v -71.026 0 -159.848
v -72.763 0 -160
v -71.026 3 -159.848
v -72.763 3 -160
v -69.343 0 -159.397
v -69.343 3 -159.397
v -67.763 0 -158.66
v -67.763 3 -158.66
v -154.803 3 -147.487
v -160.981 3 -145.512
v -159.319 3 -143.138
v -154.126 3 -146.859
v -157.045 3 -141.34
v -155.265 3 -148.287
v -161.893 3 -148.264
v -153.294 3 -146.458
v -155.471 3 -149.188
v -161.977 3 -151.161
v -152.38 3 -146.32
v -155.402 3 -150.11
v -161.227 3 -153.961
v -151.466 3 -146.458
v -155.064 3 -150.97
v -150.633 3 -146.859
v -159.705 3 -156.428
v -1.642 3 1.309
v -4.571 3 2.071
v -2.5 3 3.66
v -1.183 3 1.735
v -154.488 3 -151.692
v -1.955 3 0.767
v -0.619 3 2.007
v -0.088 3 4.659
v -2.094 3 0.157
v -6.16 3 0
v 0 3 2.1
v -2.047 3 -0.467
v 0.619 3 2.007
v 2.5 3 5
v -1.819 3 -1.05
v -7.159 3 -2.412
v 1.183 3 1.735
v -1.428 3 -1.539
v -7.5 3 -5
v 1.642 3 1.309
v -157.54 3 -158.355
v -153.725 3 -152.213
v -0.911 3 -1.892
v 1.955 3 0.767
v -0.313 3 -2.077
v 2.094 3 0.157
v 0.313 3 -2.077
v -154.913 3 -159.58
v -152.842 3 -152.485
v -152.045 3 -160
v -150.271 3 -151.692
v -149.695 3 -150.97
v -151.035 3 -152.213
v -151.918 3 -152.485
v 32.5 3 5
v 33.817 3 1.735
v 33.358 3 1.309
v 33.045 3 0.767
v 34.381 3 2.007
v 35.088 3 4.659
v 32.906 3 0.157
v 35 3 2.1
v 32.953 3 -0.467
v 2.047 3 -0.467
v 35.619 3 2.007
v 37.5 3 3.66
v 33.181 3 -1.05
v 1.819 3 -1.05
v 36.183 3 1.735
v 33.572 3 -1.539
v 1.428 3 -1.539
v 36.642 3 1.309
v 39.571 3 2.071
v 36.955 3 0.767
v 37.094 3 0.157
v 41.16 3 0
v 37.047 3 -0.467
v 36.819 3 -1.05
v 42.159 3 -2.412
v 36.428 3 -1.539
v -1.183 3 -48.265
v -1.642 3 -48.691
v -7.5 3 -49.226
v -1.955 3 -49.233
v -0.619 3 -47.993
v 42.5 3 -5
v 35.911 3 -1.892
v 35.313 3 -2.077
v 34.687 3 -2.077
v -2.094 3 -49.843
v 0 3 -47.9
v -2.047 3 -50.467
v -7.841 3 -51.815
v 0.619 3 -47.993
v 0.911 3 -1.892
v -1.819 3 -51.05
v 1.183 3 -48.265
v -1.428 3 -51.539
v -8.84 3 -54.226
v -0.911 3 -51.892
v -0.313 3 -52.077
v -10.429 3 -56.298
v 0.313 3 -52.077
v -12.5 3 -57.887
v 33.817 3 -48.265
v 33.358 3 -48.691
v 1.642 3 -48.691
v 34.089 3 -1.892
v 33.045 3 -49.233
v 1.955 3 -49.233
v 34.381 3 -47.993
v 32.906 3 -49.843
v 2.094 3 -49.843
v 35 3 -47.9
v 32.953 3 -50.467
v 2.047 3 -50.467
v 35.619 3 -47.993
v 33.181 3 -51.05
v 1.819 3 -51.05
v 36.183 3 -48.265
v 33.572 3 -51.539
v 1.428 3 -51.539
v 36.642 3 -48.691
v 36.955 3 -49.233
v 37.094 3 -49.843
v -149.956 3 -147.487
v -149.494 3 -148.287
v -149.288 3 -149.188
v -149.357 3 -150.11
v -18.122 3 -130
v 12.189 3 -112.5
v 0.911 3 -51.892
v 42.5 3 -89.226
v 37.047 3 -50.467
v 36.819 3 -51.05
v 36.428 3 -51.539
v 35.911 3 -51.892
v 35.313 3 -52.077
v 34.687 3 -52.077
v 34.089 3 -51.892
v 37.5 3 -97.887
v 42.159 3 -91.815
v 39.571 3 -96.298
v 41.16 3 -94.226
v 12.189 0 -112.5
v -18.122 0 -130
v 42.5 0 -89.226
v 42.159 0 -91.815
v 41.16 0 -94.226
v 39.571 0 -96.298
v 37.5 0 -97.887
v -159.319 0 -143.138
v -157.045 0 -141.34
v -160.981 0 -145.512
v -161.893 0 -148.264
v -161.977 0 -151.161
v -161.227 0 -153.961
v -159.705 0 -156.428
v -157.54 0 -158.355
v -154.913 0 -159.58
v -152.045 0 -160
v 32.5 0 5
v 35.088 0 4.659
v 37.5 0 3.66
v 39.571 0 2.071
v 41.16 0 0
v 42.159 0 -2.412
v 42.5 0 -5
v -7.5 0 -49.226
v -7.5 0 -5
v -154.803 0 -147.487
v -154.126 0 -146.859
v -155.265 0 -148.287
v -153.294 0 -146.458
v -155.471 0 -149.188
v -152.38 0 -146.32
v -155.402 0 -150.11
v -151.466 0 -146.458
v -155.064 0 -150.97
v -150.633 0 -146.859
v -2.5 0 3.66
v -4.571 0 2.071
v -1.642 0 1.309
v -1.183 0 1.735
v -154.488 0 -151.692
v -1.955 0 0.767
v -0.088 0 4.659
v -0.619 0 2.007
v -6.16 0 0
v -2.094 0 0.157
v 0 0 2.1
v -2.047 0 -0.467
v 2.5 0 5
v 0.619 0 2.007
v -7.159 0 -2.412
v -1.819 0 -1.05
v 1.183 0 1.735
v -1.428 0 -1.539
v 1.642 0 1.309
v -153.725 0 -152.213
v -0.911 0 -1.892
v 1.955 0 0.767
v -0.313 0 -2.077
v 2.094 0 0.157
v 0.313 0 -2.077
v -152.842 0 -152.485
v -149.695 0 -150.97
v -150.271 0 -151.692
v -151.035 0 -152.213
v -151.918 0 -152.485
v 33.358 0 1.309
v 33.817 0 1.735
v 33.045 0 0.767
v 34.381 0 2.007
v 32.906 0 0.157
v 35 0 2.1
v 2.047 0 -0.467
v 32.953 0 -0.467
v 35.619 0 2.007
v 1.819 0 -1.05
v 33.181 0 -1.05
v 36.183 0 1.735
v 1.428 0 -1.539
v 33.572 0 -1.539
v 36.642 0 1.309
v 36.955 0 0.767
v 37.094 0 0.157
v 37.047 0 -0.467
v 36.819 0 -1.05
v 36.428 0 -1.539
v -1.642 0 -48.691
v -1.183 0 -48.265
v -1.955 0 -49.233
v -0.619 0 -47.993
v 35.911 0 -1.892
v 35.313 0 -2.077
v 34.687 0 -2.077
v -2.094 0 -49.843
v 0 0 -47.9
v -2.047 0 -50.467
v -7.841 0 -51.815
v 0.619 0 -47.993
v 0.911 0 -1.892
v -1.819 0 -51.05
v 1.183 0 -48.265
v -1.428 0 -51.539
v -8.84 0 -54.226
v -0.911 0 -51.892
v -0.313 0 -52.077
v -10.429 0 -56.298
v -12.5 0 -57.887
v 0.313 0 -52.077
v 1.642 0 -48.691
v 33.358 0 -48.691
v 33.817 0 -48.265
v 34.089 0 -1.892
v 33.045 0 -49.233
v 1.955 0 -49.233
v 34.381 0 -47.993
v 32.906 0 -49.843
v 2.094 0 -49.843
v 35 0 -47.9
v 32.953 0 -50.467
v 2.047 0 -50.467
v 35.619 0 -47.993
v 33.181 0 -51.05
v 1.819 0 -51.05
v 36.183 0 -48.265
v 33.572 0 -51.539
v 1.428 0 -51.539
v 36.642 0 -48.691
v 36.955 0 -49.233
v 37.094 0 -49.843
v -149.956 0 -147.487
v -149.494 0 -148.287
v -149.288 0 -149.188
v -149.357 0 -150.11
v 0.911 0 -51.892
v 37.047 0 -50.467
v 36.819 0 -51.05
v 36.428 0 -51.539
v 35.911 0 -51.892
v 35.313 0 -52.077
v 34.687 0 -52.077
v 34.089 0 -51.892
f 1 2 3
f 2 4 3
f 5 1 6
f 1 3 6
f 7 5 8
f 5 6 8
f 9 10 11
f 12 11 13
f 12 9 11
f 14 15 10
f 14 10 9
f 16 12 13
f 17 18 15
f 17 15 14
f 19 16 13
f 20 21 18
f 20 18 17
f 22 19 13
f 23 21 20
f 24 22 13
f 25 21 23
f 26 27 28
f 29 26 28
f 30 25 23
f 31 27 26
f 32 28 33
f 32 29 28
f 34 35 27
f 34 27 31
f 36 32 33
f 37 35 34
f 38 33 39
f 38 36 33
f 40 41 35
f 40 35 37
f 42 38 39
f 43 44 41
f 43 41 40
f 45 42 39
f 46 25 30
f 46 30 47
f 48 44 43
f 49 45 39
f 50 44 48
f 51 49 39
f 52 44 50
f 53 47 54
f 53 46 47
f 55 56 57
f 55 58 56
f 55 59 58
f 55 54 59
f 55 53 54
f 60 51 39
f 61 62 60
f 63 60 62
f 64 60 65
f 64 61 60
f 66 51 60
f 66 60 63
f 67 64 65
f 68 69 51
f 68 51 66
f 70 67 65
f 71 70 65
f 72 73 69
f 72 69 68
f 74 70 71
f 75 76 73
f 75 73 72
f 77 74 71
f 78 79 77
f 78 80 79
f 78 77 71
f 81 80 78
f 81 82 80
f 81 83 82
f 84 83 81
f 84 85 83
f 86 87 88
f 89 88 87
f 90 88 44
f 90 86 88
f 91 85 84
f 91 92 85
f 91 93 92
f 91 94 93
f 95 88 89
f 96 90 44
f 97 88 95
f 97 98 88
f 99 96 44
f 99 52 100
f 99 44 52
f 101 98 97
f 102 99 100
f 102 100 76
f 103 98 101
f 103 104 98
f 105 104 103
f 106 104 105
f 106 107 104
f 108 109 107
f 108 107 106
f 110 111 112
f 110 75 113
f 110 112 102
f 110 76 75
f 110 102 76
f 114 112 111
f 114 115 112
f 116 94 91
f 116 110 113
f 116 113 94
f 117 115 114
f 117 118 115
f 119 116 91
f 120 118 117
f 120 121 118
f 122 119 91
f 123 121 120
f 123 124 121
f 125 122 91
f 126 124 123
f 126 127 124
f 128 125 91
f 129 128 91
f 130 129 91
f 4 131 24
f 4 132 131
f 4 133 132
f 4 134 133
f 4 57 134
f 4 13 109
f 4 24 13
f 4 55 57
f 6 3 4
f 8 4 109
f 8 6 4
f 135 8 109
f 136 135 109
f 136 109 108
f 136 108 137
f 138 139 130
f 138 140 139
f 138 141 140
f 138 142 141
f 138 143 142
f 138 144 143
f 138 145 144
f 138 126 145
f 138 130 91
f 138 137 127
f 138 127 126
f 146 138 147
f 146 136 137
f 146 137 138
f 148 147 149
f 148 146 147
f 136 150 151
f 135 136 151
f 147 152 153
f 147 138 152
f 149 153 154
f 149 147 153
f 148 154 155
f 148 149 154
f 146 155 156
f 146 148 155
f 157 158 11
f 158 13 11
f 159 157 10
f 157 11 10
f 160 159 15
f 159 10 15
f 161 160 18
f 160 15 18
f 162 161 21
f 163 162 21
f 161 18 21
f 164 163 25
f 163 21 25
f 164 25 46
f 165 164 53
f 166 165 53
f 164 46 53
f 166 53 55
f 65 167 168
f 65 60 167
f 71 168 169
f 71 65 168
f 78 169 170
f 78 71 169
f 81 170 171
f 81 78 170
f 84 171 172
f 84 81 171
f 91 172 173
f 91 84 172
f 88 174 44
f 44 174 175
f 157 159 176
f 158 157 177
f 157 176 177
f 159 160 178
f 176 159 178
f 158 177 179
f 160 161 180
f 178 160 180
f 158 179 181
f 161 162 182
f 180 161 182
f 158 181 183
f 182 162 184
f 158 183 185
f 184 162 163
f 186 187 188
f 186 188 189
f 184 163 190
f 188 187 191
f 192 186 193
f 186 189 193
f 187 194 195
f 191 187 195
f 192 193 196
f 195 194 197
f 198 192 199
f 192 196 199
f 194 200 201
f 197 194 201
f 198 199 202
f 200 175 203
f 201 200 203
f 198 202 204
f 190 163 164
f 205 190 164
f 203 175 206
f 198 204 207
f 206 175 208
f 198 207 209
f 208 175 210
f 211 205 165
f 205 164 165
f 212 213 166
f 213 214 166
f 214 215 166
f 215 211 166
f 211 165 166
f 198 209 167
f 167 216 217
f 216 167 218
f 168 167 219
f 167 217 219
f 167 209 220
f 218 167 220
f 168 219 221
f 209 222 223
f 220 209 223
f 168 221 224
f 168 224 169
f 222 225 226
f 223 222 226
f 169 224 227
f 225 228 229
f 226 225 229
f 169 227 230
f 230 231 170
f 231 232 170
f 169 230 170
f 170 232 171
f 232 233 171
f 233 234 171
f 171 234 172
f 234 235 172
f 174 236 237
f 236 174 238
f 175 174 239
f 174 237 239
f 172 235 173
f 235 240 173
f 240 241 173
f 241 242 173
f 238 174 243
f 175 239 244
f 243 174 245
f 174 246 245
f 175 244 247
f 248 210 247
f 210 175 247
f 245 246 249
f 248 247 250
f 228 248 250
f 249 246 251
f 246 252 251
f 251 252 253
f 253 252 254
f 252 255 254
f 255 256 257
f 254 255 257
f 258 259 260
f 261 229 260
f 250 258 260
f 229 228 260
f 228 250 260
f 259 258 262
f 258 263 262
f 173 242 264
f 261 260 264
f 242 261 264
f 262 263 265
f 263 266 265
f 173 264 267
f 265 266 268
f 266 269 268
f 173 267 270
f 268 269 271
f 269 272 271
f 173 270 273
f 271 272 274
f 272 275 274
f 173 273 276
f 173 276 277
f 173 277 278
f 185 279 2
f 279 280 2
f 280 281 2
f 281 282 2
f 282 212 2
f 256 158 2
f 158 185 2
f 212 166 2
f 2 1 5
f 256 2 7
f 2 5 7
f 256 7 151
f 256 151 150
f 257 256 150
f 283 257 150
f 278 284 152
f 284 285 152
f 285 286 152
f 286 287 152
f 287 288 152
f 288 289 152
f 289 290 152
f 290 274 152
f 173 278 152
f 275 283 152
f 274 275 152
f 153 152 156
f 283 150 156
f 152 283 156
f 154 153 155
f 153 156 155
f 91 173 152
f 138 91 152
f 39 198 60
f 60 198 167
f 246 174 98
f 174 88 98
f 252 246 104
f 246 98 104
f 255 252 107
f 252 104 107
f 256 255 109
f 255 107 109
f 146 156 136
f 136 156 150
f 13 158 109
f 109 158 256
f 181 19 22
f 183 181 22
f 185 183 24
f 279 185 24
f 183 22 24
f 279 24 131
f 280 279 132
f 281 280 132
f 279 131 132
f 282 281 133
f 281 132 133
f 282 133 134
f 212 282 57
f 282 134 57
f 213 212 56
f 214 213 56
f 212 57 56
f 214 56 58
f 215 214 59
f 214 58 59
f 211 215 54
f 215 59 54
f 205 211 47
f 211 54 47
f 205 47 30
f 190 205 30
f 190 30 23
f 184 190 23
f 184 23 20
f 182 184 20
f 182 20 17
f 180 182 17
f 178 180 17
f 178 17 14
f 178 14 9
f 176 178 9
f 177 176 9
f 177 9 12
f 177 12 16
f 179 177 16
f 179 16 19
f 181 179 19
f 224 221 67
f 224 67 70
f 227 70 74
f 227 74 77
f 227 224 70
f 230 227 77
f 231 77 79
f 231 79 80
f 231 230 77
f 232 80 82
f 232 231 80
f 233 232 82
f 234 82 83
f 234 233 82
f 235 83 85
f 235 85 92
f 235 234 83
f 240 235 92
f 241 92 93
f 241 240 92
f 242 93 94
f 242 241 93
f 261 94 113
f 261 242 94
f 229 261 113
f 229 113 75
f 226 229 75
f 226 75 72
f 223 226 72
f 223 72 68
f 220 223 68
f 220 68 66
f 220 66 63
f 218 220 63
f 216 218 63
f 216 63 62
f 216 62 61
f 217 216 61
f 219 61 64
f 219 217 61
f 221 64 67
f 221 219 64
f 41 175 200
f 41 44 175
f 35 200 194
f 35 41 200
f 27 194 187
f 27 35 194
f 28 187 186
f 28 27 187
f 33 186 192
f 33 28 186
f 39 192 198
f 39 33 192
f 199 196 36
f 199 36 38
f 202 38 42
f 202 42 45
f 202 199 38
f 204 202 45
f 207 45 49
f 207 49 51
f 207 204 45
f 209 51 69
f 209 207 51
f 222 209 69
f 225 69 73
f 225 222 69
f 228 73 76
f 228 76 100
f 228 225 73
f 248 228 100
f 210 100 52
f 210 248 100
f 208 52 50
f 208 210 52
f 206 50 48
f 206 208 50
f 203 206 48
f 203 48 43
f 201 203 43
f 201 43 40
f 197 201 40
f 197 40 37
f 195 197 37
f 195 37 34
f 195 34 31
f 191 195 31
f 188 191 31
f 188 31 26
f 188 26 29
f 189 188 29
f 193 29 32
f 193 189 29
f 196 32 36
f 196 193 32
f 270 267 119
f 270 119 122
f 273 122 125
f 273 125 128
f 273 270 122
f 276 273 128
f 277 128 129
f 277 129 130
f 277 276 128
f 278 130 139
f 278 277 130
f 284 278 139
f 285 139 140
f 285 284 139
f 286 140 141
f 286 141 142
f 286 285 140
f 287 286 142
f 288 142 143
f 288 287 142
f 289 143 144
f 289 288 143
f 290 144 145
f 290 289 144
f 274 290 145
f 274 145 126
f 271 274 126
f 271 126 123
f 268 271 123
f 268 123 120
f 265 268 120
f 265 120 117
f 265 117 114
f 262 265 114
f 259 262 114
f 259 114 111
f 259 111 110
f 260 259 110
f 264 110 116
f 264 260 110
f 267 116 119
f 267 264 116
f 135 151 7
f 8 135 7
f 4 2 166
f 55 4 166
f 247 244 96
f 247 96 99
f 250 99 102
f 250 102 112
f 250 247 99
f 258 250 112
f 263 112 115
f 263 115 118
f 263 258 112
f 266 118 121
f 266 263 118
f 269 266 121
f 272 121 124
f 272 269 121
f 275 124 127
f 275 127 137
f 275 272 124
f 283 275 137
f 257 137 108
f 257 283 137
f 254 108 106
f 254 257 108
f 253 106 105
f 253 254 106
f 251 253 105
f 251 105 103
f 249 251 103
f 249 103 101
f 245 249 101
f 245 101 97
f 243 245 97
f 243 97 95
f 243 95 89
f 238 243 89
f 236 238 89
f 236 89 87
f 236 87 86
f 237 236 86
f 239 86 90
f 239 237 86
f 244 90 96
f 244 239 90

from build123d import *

# Parameters (mm, degrees)
SKETCH_1_R          = 2.1
EXTRUDE_1_DEPTH     = 3
FILLET_1_R          = 10
SKETCH_2_R          = 3.1
CUT_EXTRUDE_1_DEPTH = 10
FILLET_2_R          = 10


with BuildPart() as part:
    # 草图1 → 凸台-拉伸1 (new body)
    with BuildSketch(Plane(origin=(0, 0, 0), x_dir=(1, 0, 0), z_dir=(0, 1, 0))):
        Polygon((-7.5, 55), (-7.5, -5), (42.5, -5), (42.5, 55), (42.5, 95), (12.189110868, 112.5), (-18.121778265, 130), (-70.083302492, 160), (-154.724318643, 160), (-189.365334795, 160), align=None)
        with Locations(Location((0, 0, 0), (0, 0, 270))):
            Circle(SKETCH_1_R, mode=Mode.SUBTRACT)
        with Locations(Location((35, 0, 0), (0, 0, 270))):
            Circle(SKETCH_1_R, mode=Mode.SUBTRACT)
        with Locations(Location((0, 50, 0), (0, 0, 270))):
            Circle(SKETCH_1_R, mode=Mode.SUBTRACT)
        with Locations(Location((35, 50, 0), (0, 0, 270))):
            Circle(SKETCH_1_R, mode=Mode.SUBTRACT)
    extrude(amount=EXTRUDE_1_DEPTH)

    # 圆角1
    fillet_1_edges = [part.edges().sort_by_distance(p)[0] for p in [
        (-70.083302492, 1.5, -160),
        (42.5, 1.5, -95),
        (-7.5, 1.5, -55),
        (-189.365334795, 1.5, -160),
    ]]
    fillet(fillet_1_edges, radius=FILLET_1_R)

    # 草图2 → 切除-拉伸1 (cut)
    with BuildSketch(Plane(origin=(0, 3, 0), x_dir=(1, 0, 0), z_dir=(0, 1, 0))):
        with Locations(Location((-152.37976321, 149.419872981, 0), (0, 0, 270))):
            Circle(SKETCH_2_R)
    extrude(amount=-CUT_EXTRUDE_1_DEPTH, mode=Mode.SUBTRACT)

    # 圆角2
    fillet_2_edges = [part.edges().sort_by_distance(p)[0] for p in [
        (42.5, 1.5, 5),
        (-7.5, 1.5, 5),
    ]]
    fillet(fillet_2_edges, radius=FILLET_2_R)


solid = part.part
